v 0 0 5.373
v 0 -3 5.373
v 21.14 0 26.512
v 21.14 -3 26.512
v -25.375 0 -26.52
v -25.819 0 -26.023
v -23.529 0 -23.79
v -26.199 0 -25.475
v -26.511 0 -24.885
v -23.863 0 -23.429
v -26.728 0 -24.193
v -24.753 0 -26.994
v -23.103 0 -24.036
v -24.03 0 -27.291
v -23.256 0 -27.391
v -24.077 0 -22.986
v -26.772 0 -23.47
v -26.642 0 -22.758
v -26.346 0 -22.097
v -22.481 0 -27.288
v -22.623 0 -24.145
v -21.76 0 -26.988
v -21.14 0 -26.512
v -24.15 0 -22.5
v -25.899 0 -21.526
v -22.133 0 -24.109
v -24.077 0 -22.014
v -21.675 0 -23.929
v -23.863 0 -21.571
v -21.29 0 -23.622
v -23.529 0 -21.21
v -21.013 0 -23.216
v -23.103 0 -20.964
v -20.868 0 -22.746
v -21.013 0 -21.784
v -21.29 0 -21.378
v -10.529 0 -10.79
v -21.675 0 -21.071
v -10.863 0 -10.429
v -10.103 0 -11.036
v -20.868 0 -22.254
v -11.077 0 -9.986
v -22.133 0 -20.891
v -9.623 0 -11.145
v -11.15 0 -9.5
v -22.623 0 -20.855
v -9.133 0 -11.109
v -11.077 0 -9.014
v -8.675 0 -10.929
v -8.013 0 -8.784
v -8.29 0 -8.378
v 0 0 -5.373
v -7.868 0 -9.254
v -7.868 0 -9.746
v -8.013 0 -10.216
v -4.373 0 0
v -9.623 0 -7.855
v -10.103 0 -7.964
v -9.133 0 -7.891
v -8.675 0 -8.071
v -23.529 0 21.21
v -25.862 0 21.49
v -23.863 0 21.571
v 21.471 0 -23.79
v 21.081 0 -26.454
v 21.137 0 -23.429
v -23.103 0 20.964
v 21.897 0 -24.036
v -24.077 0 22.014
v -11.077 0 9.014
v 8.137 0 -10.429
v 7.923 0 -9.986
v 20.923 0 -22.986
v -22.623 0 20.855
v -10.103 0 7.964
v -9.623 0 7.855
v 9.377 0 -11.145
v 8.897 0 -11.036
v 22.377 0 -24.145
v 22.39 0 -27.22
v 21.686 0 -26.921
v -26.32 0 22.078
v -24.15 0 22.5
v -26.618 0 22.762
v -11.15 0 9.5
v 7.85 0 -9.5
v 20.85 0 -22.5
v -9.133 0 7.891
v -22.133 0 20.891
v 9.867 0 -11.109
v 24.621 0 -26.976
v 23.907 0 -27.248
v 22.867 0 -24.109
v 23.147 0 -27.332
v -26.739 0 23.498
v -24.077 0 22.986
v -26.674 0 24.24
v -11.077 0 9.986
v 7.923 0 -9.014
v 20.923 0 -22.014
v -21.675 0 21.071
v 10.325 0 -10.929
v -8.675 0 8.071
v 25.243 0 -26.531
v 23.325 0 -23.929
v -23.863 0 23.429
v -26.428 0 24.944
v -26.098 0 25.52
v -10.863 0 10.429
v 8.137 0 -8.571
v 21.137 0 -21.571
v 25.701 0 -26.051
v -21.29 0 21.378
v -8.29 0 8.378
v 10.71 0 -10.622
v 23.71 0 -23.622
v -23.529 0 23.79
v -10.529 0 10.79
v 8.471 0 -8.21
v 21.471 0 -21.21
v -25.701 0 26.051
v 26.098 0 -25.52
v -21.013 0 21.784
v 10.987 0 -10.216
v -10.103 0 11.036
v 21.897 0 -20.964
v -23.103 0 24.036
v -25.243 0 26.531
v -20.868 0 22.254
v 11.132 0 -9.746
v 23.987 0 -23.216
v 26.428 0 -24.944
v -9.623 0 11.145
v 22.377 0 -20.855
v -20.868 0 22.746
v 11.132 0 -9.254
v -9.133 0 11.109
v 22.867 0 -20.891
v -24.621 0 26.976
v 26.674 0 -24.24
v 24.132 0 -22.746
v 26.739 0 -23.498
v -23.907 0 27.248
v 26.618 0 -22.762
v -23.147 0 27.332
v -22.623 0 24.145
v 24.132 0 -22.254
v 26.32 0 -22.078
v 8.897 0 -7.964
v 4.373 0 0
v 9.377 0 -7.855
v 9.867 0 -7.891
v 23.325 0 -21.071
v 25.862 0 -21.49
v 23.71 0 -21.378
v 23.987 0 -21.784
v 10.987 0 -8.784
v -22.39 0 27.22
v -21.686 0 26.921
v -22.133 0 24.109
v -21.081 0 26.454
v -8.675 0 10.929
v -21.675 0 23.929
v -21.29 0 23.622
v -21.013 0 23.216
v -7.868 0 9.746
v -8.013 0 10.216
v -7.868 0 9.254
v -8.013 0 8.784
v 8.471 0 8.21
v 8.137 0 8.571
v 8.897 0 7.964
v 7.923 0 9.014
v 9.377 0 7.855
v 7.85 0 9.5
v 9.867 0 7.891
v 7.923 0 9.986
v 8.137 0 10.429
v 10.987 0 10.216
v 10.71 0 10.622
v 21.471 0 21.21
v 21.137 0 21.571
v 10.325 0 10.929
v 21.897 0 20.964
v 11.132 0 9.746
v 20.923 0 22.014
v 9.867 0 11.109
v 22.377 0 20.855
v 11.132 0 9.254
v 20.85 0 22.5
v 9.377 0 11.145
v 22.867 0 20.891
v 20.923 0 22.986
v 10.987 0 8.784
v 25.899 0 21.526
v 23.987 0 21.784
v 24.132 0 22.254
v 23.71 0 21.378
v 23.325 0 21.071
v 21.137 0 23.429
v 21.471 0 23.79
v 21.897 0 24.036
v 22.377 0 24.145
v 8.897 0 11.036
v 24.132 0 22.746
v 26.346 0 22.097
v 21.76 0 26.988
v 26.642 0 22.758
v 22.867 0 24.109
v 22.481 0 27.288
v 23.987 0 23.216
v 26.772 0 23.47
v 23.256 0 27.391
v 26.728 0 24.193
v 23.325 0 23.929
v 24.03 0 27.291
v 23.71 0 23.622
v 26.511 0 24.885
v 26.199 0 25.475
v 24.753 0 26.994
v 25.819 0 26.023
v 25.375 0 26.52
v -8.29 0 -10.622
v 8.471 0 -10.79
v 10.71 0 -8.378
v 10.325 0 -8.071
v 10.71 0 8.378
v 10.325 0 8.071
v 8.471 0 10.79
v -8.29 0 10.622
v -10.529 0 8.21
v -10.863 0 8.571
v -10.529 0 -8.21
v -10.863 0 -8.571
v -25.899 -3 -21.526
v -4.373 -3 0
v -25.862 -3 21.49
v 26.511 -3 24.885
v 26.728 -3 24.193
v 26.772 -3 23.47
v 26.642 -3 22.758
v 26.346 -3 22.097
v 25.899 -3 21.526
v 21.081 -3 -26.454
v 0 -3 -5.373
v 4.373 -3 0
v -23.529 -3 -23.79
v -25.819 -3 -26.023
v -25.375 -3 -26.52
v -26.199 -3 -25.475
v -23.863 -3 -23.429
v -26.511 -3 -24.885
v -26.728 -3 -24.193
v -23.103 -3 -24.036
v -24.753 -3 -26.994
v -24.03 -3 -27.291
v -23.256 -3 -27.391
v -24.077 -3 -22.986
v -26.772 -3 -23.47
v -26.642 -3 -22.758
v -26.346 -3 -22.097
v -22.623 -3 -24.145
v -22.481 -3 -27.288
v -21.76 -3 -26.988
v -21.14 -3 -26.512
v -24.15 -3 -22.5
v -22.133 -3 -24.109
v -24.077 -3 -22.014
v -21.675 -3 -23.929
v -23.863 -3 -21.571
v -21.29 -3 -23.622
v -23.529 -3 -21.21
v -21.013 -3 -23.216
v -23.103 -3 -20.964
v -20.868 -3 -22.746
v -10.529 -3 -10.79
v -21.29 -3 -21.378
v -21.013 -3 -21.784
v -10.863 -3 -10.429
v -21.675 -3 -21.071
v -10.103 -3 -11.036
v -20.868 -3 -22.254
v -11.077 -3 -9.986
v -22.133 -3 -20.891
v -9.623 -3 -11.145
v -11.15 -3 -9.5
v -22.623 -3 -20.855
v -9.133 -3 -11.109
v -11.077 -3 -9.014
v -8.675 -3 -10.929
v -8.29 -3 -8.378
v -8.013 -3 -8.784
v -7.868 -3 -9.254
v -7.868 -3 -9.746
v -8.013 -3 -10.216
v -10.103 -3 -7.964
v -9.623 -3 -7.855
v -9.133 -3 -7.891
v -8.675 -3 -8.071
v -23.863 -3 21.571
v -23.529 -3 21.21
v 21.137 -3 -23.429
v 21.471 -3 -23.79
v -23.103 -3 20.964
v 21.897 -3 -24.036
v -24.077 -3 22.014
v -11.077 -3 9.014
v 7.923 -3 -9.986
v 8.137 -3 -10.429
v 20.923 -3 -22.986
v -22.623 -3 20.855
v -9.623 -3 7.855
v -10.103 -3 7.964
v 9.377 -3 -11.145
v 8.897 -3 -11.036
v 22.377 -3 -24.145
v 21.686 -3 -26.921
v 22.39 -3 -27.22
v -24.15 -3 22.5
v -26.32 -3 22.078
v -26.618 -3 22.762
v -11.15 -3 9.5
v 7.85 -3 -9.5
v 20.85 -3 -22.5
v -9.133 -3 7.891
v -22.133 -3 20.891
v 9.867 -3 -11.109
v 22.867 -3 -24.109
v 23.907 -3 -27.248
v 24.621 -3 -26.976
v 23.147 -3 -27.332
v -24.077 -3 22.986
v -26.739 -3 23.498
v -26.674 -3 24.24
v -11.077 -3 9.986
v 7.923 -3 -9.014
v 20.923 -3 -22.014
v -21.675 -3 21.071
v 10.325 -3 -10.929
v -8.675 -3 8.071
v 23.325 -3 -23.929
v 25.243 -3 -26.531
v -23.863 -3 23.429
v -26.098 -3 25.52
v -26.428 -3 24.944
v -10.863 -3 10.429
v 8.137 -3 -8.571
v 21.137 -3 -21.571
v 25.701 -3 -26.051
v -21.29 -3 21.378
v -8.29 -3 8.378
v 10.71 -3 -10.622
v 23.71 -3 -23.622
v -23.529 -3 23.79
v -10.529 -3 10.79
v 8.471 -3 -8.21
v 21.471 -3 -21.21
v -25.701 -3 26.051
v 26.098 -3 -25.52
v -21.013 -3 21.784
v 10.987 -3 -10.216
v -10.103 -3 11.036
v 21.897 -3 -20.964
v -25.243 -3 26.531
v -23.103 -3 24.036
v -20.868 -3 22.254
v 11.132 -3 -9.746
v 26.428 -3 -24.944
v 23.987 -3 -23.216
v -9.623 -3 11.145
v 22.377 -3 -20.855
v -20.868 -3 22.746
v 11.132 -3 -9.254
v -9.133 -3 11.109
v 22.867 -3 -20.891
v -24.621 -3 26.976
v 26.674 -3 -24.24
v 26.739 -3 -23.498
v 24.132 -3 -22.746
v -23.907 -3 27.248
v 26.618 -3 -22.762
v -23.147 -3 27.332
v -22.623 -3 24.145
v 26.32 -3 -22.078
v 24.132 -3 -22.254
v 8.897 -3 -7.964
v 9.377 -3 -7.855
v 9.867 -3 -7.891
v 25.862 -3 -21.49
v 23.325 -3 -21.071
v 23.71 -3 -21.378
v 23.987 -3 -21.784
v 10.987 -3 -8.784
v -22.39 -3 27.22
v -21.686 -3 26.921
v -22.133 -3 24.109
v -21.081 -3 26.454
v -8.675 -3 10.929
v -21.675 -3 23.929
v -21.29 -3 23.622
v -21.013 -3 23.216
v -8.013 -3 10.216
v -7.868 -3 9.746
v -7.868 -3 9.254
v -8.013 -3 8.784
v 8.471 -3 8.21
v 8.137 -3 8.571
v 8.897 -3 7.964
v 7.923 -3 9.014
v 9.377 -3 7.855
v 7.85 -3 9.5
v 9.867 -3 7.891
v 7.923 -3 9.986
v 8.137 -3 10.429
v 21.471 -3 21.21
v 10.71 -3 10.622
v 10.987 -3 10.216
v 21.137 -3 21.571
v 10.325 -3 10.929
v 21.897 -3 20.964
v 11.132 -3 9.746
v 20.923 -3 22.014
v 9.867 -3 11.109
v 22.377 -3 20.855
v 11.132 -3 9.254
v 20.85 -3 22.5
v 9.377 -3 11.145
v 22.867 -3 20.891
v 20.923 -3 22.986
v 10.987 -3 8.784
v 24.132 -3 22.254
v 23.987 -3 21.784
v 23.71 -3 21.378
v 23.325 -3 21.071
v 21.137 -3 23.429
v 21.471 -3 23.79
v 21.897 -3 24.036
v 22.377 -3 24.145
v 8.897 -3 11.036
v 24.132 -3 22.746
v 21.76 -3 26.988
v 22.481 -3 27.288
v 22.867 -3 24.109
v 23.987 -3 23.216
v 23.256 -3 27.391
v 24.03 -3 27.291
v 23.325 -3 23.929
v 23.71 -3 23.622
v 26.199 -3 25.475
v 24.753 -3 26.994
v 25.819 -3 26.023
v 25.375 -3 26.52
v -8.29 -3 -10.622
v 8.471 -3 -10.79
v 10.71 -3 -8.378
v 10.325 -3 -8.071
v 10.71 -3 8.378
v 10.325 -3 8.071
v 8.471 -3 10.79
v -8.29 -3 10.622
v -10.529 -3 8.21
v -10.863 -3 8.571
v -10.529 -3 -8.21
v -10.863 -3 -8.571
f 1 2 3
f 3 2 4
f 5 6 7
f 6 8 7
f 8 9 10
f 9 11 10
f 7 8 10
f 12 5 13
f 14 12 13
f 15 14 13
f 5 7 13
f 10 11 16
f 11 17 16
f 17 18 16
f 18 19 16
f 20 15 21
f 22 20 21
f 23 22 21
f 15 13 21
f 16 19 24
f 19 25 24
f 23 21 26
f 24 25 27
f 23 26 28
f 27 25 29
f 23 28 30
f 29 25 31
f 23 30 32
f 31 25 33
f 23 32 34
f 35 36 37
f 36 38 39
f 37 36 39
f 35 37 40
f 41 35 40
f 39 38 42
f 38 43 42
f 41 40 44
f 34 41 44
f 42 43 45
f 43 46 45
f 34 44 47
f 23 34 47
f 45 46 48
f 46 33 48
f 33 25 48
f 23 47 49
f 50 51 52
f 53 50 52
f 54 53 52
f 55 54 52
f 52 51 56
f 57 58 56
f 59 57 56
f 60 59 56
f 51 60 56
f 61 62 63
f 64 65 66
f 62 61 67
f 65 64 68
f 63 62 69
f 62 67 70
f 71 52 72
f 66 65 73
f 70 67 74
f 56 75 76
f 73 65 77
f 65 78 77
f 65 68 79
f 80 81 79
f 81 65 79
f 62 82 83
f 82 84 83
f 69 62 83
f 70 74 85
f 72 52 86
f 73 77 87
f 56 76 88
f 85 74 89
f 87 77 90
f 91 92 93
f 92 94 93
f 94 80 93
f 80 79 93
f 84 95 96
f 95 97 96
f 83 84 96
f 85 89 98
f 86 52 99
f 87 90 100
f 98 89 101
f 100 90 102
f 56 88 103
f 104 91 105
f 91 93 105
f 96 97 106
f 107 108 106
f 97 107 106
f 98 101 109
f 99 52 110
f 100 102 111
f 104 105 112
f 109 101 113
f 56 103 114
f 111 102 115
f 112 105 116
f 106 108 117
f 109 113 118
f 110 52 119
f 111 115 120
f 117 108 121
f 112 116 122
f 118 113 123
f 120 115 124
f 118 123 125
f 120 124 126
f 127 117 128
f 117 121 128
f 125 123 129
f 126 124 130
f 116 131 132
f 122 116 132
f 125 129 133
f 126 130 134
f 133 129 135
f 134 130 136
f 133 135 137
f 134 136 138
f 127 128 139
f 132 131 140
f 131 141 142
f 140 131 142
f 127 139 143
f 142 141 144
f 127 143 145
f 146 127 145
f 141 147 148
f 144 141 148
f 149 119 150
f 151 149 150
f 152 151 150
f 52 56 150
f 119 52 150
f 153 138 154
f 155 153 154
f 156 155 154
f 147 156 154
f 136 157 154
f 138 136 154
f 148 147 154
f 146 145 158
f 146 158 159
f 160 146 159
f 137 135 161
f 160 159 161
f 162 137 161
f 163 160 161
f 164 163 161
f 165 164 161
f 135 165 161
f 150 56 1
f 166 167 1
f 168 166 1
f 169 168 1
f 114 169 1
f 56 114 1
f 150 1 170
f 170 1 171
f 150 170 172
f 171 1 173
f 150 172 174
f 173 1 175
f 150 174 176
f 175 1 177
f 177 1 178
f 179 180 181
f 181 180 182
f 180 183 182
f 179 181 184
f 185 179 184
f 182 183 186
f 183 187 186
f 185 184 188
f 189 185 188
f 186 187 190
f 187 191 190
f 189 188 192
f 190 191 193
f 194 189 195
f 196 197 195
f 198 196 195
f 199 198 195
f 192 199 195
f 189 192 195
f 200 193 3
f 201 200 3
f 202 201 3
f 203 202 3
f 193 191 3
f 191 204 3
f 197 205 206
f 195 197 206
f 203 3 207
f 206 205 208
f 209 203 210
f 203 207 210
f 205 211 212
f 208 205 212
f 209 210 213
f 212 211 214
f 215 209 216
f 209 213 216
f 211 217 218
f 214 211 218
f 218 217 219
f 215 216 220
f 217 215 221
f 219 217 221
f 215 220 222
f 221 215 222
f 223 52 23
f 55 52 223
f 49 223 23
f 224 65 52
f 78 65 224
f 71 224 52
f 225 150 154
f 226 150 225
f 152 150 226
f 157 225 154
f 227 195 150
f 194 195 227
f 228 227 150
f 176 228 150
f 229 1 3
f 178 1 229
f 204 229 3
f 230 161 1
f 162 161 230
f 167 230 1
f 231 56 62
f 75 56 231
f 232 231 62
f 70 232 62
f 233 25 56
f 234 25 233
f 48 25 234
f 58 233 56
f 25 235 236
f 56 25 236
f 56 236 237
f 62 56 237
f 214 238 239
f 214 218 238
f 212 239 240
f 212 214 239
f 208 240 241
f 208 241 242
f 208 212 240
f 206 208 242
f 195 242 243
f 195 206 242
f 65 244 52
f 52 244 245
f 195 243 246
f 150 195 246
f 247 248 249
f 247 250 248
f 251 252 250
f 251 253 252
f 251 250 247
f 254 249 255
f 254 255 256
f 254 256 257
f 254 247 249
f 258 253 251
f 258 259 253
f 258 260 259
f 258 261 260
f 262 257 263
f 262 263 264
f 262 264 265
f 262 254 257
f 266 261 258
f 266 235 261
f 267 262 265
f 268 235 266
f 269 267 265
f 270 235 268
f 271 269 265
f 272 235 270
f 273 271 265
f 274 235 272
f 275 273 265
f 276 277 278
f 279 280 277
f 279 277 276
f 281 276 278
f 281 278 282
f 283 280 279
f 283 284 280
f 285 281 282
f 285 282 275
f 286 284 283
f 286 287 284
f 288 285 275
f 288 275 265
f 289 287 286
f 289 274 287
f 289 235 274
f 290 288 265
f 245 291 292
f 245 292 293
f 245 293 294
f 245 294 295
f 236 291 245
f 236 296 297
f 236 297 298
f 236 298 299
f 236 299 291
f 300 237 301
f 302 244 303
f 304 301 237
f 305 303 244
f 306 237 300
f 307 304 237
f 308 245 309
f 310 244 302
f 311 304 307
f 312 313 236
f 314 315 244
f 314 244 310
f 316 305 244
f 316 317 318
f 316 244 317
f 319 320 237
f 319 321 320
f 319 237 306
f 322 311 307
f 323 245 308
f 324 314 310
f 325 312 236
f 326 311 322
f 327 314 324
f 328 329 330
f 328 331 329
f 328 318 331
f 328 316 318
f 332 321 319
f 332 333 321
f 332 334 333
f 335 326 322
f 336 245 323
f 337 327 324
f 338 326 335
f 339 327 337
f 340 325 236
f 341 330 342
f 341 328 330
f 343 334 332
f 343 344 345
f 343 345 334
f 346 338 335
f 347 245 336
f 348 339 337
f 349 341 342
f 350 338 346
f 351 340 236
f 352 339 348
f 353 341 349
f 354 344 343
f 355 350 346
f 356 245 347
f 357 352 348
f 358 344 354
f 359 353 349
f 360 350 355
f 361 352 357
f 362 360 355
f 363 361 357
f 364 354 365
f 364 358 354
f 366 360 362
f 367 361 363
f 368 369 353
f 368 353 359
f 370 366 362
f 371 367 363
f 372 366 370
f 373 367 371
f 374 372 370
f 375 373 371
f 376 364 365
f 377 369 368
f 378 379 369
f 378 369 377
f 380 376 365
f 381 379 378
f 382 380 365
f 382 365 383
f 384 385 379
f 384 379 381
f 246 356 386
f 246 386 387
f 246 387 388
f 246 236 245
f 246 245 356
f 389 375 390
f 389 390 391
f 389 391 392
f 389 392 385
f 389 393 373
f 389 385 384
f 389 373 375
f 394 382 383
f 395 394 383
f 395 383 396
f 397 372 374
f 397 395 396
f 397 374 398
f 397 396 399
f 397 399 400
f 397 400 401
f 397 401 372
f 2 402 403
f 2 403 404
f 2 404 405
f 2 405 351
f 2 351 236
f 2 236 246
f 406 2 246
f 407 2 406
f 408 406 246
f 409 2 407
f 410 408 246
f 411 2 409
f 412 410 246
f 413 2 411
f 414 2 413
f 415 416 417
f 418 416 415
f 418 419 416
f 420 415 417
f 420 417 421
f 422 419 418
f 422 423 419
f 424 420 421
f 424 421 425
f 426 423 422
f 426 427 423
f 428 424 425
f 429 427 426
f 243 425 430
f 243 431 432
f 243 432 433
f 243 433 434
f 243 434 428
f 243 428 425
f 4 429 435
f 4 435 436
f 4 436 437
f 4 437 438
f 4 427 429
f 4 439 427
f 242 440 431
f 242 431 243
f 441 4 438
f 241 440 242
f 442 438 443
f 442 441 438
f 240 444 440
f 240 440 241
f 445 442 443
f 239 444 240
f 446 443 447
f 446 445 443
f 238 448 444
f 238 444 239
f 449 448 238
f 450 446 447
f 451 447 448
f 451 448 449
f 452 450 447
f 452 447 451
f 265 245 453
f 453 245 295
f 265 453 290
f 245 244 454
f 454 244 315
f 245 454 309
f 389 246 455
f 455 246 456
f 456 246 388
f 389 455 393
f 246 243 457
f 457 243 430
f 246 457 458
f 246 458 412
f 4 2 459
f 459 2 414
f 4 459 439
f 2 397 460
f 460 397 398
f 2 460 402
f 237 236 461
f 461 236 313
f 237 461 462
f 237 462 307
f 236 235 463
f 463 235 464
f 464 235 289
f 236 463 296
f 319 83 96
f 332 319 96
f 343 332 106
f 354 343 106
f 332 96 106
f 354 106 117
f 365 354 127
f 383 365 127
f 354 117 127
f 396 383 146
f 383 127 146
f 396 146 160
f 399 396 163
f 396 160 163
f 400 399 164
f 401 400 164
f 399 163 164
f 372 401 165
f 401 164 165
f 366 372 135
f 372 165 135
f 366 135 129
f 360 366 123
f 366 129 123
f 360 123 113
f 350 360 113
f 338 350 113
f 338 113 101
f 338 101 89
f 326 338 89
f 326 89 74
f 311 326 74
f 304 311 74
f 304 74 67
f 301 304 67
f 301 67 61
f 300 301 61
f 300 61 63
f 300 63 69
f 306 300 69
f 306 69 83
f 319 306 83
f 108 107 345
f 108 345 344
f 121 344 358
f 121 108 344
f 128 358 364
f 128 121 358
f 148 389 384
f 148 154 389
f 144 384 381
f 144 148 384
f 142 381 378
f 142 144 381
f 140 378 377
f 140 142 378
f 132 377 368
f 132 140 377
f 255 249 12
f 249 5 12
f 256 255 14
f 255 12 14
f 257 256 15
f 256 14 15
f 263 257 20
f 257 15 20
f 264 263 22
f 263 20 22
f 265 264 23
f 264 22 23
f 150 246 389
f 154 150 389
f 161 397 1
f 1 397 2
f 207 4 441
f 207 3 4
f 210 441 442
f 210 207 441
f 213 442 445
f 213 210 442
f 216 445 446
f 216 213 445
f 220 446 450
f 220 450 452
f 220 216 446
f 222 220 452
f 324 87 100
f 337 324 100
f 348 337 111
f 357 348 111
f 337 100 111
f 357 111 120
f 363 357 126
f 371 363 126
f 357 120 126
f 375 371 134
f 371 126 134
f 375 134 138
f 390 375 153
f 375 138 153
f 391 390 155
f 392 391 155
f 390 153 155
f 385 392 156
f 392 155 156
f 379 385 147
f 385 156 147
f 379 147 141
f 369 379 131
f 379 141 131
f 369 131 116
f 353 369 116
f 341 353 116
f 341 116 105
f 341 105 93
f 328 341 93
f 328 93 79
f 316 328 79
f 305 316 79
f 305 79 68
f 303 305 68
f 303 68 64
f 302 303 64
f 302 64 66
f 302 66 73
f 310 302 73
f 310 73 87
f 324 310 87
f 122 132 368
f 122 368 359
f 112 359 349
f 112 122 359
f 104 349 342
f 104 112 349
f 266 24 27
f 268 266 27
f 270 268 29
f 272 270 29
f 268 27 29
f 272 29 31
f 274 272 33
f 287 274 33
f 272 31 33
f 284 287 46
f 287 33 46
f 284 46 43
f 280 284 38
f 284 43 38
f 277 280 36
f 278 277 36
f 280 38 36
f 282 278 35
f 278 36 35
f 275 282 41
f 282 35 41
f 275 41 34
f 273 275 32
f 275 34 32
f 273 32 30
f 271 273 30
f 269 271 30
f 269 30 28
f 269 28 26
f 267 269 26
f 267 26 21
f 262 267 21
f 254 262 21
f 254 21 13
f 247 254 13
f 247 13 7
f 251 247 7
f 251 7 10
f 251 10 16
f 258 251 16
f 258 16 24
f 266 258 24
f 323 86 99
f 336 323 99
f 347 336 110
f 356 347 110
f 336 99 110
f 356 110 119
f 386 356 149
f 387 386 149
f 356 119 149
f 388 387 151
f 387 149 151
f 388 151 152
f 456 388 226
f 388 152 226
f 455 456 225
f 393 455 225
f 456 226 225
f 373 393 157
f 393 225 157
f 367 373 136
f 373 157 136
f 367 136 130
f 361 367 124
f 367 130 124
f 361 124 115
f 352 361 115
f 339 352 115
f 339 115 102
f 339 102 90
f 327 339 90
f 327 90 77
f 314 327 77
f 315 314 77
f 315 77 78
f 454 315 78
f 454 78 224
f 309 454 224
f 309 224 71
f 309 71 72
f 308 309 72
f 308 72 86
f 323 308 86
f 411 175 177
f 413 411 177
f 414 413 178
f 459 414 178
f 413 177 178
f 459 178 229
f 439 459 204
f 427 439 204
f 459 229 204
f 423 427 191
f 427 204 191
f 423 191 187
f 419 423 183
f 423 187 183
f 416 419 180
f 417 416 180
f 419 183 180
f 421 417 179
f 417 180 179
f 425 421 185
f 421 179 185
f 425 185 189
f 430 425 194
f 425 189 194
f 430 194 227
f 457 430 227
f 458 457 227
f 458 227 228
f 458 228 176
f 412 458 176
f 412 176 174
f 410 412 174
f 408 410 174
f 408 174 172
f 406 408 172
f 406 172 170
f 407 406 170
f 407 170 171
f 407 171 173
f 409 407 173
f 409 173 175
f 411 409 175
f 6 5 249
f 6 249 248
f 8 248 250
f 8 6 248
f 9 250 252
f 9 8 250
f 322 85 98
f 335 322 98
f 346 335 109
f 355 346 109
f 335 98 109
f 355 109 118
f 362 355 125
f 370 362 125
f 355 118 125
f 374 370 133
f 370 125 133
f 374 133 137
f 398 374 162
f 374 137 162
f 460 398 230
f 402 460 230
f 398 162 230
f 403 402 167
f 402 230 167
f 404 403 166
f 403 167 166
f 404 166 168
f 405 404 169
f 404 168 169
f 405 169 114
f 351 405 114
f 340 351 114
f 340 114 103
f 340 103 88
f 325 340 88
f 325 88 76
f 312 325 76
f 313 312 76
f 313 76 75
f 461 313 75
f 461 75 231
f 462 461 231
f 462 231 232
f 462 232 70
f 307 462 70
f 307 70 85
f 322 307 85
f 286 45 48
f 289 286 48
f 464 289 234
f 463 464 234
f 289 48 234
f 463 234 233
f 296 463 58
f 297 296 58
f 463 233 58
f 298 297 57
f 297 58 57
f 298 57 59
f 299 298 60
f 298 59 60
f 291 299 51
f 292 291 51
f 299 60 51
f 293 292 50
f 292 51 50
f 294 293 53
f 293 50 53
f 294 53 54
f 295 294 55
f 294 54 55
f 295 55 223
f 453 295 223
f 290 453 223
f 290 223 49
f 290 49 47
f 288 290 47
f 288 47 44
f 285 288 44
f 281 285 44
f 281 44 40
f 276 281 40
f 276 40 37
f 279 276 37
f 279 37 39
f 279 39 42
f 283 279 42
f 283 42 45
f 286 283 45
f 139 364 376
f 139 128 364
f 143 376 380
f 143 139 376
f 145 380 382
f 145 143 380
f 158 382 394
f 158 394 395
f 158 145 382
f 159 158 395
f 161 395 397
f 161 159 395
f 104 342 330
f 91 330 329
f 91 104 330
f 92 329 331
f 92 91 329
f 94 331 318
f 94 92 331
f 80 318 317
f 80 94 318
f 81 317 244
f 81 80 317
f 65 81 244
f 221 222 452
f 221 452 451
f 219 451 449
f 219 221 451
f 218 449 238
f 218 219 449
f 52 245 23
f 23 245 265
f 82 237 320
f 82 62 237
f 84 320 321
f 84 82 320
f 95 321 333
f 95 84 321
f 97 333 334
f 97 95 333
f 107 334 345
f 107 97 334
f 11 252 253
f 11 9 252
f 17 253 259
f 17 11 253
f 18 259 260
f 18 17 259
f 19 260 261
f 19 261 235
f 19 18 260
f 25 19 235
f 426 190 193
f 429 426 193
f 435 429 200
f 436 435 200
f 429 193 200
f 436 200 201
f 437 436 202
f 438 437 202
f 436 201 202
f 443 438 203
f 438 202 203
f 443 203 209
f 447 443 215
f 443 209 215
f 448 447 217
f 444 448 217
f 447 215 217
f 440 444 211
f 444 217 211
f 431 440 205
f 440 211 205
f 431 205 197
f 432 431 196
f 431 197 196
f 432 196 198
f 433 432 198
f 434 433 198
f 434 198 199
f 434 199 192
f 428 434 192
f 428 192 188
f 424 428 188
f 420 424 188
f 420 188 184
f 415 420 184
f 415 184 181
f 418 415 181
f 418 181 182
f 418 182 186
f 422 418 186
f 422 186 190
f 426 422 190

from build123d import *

# Parameters (mm, degrees)
F0_W        = 54
F0_H        = 56
F1_DEPTH    = 3
F3_D        = 3.3
F3_DEPTH    = 4.55
F3_TIP      = 0.9914200214
F5_DEPTH    = 3.001
F7_D        = 3.3
F7_DEPTH    = 4.55
F7_TIP      = 0.9914200214
F8_T1_DEPTH = 29.9160411803
F8_T3_DEPTH = 30.4926194226
F8_T5_DEPTH = 30.4926194226
F8_T7_DEPTH = 29.9160411803
F9_R        = 3


# Not quite as in the source:
# - a fillet or chamfer that OpenCascade refuses, or shapes differently, is made with other operations: its cross-section is extruded or revolved along the edge and cut away or added


with BuildPart() as f1:
    # F0 (on Front) → F1 (new body)
    with BuildSketch(Plane.XZ):
        Rectangle(F0_W, F0_H)
    extrude(amount=F1_DEPTH)

    # F3
    with Locations(Plane.XZ.offset(3)):
        with Locations((-22.5, 22.5), (22.5, 22.5), (22.5, -22.5), (-22.5, -22.5)):
            Hole(F3_D / 2, depth=F3_DEPTH)
            with Locations((0, 0, -(F3_DEPTH + F3_TIP / 2))):  # 118° drill point
                Cone(0, F3_D / 2, F3_TIP, mode=Mode.SUBTRACT)

    # F4 (on face) → F5 (cut, through all)
    with BuildSketch(Plane.XZ.offset(3)):
        Polygon((-4.372583002, 0), (-27, 22.627416998), (-27, -22.627416998), align=None)
        Polygon((22.627416998, 28), (-22.627416998, 28), (0, 5.372583002), align=None)
        Polygon((27, -22.627416998), (27, 22.627416998), (4.372583002, 0), align=None)
        Polygon((0, -5.372583002), (-22.627416998, -28), (22.627416998, -28), align=None)
    extrude(amount=-F5_DEPTH, mode=Mode.SUBTRACT)

    # F7
    with Locations(Plane.XZ.offset(3)):
        with Locations((-9.5, 9.5), (9.5, 9.5), (9.5, -9.5), (-9.5, -9.5)):
            Hole(F7_D / 2, depth=F7_DEPTH)
            with Locations((0, 0, -(F7_DEPTH + F7_TIP / 2))):  # 118° drill point
                Cone(0, F7_D / 2, F7_TIP, mode=Mode.SUBTRACT)

    # F8: fillet of radius 5.5 on 4 edges, made by hand

    # F8_s2 → F8_t1 (cut)
    with BuildSketch(Plane.XZ.offset(-13.4580205902)):
        with BuildLine():
            ThreePointArc((-22.627416998, -28), (-25.7691213082, -26.0844427348), (-27, -22.6167917639))
            Line((-27, -22.6167917639), (-27, -28))
            Line((-27, -28), (-22.627416998, -28))
        make_face()
    extrude(amount=F8_T1_DEPTH, mode=Mode.SUBTRACT)

    # F8_s4 → F8_t3 (cut)
    with BuildSketch(Plane.XZ.offset(-13.7463097113)):
        with BuildLine():
            ThreePointArc((-27, 22.627416998), (-25.3452507259, 26.4338780795), (-21.5014761155, 28))
            Line((-21.5014761155, 28), (-27, 28))
            Line((-27, 28), (-27, 22.627416998))
        make_face()
    extrude(amount=F8_T3_DEPTH, mode=Mode.SUBTRACT)

    # F8_s6 → F8_t5 (cut)
    with BuildSketch(Plane.XZ.offset(-13.7463097113)):
        with BuildLine():
            ThreePointArc((27, -22.627416998), (25.3452507259, -26.4338780795), (21.5014761155, -28))
            Line((21.5014761155, -28), (27, -28))
            Line((27, -28), (27, -22.627416998))
        make_face()
    extrude(amount=F8_T5_DEPTH, mode=Mode.SUBTRACT)

    # F8_s8 → F8_t7 (cut)
    with BuildSketch(Plane.XZ.offset(-13.4580205902)):
        with BuildLine():
            ThreePointArc((22.627416998, 28), (25.7691213082, 26.0844427348), (27, 22.6167917639))
            Line((27, 22.6167917639), (27, 28))
            Line((27, 28), (22.627416998, 28))
        make_face()
    extrude(amount=F8_T7_DEPTH, mode=Mode.SUBTRACT)

    # F9
    f9_edges = [f1.edges().sort_by_distance(p)[0] for p in [
        (-27, -1.5, 22.627417),
        (-26.99999, -1.5, -22.627407),
        (27, -1.5, -22.627417),
        (26.99999, -1.5, 22.627407),
        (-22.627417, -1.5, -28),
        (22.530329, -1.5, -27.902912),
        (-22.530329, -1.5, 27.902912),
        (22.627417, -1.5, 28),
    ]]
    fillet(f9_edges, radius=F9_R)


solid = f1.part
